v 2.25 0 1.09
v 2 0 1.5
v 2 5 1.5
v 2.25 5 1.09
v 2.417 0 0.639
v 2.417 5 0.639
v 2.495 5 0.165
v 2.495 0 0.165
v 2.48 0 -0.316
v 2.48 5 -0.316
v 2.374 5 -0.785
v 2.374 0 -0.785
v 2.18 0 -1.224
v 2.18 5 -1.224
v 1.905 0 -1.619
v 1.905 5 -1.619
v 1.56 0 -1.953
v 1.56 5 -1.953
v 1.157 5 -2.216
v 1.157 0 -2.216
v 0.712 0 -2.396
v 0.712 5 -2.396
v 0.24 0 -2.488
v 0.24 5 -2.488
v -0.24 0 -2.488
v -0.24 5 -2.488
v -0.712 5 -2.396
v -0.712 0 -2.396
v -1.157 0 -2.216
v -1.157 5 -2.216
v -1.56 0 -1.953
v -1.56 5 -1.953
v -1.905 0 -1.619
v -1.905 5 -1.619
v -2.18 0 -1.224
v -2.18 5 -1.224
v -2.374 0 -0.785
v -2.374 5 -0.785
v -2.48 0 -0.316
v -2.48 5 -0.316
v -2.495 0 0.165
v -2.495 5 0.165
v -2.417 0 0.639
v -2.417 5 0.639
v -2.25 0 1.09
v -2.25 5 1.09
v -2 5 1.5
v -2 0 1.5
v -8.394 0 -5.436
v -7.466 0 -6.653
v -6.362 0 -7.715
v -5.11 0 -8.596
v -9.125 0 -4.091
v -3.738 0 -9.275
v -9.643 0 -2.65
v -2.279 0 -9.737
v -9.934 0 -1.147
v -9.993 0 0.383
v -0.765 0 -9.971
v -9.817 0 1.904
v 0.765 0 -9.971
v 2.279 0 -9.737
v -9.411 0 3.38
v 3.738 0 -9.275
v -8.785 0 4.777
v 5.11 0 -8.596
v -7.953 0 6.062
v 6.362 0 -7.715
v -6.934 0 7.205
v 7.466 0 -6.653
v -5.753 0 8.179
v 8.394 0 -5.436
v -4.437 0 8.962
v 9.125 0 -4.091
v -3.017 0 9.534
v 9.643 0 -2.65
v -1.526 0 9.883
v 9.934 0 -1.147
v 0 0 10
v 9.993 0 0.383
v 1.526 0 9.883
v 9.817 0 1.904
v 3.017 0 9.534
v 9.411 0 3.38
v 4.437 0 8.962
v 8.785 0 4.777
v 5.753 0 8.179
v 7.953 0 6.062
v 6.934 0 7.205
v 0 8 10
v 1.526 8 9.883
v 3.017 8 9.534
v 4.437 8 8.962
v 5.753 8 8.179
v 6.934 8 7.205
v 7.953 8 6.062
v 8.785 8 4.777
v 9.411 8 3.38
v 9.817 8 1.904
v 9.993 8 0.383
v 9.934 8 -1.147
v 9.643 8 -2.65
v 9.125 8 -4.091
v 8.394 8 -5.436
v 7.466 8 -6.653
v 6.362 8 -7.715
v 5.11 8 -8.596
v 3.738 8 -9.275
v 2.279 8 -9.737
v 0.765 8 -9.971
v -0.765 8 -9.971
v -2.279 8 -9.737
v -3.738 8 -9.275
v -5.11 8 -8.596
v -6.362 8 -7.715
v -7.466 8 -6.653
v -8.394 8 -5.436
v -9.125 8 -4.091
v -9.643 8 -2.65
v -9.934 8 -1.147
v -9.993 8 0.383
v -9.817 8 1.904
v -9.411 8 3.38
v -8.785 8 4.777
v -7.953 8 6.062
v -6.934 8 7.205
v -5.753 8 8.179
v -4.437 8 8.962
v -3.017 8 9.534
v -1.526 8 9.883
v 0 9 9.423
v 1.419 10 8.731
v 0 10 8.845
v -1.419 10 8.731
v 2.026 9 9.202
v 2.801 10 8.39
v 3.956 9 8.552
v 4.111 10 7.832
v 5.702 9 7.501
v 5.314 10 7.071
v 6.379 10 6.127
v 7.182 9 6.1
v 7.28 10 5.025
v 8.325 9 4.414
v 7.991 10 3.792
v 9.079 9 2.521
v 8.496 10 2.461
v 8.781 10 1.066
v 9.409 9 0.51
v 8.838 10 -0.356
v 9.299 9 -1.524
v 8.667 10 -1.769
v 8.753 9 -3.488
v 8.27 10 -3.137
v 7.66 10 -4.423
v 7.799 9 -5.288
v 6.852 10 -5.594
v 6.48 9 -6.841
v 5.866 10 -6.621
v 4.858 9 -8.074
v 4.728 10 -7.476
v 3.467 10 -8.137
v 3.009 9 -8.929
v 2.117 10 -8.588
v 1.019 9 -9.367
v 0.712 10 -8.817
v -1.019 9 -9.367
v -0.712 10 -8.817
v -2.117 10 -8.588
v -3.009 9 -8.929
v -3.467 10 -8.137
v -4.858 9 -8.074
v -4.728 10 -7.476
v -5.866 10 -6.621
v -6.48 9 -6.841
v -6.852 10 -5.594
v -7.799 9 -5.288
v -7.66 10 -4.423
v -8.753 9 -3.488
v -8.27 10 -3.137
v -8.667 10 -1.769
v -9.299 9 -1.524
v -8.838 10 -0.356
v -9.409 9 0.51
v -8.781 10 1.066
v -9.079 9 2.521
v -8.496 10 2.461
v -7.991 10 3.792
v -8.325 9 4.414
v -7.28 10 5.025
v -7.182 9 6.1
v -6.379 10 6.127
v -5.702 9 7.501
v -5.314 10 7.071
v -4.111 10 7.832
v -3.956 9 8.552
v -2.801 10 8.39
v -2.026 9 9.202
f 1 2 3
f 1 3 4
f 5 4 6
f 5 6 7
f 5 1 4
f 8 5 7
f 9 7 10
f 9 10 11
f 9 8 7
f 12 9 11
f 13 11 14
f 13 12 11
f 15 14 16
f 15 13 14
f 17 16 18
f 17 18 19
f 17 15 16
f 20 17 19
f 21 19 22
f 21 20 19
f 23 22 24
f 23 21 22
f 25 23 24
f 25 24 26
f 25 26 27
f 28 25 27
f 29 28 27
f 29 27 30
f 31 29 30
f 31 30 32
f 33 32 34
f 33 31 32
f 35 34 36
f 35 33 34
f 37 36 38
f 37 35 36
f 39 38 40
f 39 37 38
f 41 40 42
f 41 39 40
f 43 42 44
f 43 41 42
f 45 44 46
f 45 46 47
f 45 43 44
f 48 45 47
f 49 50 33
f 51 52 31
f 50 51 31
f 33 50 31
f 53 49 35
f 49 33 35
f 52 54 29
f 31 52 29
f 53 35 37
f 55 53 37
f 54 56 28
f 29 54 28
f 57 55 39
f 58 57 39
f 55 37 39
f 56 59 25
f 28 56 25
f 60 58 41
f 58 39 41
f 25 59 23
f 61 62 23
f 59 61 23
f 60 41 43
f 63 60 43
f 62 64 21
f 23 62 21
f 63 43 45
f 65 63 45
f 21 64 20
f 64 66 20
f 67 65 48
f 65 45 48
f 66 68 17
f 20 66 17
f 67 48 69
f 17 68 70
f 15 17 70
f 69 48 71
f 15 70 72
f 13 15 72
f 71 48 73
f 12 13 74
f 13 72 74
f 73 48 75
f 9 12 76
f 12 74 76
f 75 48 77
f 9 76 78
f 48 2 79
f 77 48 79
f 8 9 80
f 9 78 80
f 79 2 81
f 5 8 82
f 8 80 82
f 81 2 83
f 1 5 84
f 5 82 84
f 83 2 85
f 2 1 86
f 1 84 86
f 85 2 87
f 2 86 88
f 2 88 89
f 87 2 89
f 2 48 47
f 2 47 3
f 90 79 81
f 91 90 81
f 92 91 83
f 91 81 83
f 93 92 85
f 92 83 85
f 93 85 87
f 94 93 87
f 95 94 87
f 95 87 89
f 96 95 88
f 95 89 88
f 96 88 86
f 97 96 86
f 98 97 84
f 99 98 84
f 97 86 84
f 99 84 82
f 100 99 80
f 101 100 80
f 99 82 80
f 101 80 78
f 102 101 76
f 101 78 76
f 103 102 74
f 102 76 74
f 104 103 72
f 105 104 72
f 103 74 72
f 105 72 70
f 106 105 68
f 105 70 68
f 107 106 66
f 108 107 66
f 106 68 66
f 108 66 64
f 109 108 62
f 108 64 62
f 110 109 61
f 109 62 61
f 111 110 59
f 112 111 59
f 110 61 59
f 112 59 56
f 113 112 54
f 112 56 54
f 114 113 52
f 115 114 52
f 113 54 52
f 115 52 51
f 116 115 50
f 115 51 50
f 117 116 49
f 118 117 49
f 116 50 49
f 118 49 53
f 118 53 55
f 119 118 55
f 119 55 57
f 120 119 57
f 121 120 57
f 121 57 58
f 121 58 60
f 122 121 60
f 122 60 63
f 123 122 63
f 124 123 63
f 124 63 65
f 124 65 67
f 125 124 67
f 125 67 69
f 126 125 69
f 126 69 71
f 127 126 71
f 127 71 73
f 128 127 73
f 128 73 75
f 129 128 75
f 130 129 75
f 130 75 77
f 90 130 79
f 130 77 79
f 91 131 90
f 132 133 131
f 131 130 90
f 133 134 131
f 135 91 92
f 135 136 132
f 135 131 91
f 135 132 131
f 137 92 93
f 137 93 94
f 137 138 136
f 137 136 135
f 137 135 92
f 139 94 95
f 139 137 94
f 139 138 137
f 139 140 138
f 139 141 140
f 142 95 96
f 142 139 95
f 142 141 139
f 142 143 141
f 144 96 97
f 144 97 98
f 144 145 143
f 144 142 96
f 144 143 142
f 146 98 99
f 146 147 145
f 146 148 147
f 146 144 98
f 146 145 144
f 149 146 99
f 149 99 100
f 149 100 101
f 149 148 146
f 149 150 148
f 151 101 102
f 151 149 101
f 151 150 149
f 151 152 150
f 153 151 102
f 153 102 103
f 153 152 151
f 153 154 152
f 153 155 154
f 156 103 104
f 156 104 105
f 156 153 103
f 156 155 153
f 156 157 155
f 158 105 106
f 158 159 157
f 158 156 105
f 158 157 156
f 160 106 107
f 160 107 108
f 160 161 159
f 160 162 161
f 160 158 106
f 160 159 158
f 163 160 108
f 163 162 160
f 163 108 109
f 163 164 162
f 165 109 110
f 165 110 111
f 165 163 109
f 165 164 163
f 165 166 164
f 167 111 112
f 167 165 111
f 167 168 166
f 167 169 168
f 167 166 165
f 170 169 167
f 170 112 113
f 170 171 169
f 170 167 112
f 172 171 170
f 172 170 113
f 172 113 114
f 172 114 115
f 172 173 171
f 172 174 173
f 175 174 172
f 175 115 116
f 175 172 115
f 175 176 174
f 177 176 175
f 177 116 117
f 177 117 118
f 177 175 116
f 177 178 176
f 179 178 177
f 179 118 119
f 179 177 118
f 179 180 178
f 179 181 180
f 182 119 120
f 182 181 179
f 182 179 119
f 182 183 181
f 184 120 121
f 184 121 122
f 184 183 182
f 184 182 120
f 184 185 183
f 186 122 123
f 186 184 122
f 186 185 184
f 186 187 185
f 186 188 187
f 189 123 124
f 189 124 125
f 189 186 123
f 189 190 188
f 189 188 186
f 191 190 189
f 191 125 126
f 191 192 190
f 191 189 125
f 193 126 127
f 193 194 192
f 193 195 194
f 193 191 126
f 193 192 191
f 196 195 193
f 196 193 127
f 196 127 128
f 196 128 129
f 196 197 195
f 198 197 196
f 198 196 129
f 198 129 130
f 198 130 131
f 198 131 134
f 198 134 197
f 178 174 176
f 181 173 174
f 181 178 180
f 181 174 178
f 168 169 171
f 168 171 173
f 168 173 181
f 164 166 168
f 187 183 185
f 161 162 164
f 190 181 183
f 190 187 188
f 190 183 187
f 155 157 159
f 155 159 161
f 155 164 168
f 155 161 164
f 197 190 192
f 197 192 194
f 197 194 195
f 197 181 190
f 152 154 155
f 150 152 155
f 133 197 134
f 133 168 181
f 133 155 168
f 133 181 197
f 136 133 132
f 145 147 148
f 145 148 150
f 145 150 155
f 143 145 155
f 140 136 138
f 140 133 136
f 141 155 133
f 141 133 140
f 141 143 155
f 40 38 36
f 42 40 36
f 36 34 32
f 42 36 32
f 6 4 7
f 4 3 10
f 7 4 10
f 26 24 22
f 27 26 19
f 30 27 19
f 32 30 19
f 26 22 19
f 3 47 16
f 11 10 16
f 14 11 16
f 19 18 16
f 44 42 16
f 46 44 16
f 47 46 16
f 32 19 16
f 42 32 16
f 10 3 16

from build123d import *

# Parameters (mm, degrees)
SKETCH_148_R          = 10
EXTRUDE_195_DEPTH     = 10
CUT_EXTRUDE_296_DEPTH = 5
CHAMFER_1_SIZE        = 2
CHAMFER_1_SIZE2       = 1.154700538


with BuildPart() as part:
    # Sketch 148 → Extrude 195 (new body)
    with BuildSketch(Plane(origin=(0, 0, 0), x_dir=(1, 0, 0), z_dir=(0, 1, 0))):
        with Locations(Location((0, 0, 0), (0, 0, 270))):
            Circle(SKETCH_148_R)
    extrude(amount=EXTRUDE_195_DEPTH)

    # Sketch 234 → Cut-Extrude 296 (cut)
    with BuildSketch(Plane(origin=(0, 0, 0), x_dir=(1, 0, 0), z_dir=(0, 1, 0))):
        with BuildLine():
            Line((-2, -1.5), (2, -1.5))
            ThreePointArc((2, -1.5), (0, 2.5), (-2, -1.5))
        make_face()
    extrude(amount=CUT_EXTRUDE_296_DEPTH, mode=Mode.SUBTRACT)

    # Фаска1
    chamfer_1_edges = [part.edges().sort_by_distance(p)[0] for p in [
        (0, 10, -10),
    ]]
    chamfer_1_side = [part.faces().sort_by_distance(p)[0] for p in [
        (0, 5, -10),
    ]]
    chamfer(chamfer_1_edges, length=CHAMFER_1_SIZE, length2=CHAMFER_1_SIZE2, reference=chamfer_1_side[0])


solid = part.part
